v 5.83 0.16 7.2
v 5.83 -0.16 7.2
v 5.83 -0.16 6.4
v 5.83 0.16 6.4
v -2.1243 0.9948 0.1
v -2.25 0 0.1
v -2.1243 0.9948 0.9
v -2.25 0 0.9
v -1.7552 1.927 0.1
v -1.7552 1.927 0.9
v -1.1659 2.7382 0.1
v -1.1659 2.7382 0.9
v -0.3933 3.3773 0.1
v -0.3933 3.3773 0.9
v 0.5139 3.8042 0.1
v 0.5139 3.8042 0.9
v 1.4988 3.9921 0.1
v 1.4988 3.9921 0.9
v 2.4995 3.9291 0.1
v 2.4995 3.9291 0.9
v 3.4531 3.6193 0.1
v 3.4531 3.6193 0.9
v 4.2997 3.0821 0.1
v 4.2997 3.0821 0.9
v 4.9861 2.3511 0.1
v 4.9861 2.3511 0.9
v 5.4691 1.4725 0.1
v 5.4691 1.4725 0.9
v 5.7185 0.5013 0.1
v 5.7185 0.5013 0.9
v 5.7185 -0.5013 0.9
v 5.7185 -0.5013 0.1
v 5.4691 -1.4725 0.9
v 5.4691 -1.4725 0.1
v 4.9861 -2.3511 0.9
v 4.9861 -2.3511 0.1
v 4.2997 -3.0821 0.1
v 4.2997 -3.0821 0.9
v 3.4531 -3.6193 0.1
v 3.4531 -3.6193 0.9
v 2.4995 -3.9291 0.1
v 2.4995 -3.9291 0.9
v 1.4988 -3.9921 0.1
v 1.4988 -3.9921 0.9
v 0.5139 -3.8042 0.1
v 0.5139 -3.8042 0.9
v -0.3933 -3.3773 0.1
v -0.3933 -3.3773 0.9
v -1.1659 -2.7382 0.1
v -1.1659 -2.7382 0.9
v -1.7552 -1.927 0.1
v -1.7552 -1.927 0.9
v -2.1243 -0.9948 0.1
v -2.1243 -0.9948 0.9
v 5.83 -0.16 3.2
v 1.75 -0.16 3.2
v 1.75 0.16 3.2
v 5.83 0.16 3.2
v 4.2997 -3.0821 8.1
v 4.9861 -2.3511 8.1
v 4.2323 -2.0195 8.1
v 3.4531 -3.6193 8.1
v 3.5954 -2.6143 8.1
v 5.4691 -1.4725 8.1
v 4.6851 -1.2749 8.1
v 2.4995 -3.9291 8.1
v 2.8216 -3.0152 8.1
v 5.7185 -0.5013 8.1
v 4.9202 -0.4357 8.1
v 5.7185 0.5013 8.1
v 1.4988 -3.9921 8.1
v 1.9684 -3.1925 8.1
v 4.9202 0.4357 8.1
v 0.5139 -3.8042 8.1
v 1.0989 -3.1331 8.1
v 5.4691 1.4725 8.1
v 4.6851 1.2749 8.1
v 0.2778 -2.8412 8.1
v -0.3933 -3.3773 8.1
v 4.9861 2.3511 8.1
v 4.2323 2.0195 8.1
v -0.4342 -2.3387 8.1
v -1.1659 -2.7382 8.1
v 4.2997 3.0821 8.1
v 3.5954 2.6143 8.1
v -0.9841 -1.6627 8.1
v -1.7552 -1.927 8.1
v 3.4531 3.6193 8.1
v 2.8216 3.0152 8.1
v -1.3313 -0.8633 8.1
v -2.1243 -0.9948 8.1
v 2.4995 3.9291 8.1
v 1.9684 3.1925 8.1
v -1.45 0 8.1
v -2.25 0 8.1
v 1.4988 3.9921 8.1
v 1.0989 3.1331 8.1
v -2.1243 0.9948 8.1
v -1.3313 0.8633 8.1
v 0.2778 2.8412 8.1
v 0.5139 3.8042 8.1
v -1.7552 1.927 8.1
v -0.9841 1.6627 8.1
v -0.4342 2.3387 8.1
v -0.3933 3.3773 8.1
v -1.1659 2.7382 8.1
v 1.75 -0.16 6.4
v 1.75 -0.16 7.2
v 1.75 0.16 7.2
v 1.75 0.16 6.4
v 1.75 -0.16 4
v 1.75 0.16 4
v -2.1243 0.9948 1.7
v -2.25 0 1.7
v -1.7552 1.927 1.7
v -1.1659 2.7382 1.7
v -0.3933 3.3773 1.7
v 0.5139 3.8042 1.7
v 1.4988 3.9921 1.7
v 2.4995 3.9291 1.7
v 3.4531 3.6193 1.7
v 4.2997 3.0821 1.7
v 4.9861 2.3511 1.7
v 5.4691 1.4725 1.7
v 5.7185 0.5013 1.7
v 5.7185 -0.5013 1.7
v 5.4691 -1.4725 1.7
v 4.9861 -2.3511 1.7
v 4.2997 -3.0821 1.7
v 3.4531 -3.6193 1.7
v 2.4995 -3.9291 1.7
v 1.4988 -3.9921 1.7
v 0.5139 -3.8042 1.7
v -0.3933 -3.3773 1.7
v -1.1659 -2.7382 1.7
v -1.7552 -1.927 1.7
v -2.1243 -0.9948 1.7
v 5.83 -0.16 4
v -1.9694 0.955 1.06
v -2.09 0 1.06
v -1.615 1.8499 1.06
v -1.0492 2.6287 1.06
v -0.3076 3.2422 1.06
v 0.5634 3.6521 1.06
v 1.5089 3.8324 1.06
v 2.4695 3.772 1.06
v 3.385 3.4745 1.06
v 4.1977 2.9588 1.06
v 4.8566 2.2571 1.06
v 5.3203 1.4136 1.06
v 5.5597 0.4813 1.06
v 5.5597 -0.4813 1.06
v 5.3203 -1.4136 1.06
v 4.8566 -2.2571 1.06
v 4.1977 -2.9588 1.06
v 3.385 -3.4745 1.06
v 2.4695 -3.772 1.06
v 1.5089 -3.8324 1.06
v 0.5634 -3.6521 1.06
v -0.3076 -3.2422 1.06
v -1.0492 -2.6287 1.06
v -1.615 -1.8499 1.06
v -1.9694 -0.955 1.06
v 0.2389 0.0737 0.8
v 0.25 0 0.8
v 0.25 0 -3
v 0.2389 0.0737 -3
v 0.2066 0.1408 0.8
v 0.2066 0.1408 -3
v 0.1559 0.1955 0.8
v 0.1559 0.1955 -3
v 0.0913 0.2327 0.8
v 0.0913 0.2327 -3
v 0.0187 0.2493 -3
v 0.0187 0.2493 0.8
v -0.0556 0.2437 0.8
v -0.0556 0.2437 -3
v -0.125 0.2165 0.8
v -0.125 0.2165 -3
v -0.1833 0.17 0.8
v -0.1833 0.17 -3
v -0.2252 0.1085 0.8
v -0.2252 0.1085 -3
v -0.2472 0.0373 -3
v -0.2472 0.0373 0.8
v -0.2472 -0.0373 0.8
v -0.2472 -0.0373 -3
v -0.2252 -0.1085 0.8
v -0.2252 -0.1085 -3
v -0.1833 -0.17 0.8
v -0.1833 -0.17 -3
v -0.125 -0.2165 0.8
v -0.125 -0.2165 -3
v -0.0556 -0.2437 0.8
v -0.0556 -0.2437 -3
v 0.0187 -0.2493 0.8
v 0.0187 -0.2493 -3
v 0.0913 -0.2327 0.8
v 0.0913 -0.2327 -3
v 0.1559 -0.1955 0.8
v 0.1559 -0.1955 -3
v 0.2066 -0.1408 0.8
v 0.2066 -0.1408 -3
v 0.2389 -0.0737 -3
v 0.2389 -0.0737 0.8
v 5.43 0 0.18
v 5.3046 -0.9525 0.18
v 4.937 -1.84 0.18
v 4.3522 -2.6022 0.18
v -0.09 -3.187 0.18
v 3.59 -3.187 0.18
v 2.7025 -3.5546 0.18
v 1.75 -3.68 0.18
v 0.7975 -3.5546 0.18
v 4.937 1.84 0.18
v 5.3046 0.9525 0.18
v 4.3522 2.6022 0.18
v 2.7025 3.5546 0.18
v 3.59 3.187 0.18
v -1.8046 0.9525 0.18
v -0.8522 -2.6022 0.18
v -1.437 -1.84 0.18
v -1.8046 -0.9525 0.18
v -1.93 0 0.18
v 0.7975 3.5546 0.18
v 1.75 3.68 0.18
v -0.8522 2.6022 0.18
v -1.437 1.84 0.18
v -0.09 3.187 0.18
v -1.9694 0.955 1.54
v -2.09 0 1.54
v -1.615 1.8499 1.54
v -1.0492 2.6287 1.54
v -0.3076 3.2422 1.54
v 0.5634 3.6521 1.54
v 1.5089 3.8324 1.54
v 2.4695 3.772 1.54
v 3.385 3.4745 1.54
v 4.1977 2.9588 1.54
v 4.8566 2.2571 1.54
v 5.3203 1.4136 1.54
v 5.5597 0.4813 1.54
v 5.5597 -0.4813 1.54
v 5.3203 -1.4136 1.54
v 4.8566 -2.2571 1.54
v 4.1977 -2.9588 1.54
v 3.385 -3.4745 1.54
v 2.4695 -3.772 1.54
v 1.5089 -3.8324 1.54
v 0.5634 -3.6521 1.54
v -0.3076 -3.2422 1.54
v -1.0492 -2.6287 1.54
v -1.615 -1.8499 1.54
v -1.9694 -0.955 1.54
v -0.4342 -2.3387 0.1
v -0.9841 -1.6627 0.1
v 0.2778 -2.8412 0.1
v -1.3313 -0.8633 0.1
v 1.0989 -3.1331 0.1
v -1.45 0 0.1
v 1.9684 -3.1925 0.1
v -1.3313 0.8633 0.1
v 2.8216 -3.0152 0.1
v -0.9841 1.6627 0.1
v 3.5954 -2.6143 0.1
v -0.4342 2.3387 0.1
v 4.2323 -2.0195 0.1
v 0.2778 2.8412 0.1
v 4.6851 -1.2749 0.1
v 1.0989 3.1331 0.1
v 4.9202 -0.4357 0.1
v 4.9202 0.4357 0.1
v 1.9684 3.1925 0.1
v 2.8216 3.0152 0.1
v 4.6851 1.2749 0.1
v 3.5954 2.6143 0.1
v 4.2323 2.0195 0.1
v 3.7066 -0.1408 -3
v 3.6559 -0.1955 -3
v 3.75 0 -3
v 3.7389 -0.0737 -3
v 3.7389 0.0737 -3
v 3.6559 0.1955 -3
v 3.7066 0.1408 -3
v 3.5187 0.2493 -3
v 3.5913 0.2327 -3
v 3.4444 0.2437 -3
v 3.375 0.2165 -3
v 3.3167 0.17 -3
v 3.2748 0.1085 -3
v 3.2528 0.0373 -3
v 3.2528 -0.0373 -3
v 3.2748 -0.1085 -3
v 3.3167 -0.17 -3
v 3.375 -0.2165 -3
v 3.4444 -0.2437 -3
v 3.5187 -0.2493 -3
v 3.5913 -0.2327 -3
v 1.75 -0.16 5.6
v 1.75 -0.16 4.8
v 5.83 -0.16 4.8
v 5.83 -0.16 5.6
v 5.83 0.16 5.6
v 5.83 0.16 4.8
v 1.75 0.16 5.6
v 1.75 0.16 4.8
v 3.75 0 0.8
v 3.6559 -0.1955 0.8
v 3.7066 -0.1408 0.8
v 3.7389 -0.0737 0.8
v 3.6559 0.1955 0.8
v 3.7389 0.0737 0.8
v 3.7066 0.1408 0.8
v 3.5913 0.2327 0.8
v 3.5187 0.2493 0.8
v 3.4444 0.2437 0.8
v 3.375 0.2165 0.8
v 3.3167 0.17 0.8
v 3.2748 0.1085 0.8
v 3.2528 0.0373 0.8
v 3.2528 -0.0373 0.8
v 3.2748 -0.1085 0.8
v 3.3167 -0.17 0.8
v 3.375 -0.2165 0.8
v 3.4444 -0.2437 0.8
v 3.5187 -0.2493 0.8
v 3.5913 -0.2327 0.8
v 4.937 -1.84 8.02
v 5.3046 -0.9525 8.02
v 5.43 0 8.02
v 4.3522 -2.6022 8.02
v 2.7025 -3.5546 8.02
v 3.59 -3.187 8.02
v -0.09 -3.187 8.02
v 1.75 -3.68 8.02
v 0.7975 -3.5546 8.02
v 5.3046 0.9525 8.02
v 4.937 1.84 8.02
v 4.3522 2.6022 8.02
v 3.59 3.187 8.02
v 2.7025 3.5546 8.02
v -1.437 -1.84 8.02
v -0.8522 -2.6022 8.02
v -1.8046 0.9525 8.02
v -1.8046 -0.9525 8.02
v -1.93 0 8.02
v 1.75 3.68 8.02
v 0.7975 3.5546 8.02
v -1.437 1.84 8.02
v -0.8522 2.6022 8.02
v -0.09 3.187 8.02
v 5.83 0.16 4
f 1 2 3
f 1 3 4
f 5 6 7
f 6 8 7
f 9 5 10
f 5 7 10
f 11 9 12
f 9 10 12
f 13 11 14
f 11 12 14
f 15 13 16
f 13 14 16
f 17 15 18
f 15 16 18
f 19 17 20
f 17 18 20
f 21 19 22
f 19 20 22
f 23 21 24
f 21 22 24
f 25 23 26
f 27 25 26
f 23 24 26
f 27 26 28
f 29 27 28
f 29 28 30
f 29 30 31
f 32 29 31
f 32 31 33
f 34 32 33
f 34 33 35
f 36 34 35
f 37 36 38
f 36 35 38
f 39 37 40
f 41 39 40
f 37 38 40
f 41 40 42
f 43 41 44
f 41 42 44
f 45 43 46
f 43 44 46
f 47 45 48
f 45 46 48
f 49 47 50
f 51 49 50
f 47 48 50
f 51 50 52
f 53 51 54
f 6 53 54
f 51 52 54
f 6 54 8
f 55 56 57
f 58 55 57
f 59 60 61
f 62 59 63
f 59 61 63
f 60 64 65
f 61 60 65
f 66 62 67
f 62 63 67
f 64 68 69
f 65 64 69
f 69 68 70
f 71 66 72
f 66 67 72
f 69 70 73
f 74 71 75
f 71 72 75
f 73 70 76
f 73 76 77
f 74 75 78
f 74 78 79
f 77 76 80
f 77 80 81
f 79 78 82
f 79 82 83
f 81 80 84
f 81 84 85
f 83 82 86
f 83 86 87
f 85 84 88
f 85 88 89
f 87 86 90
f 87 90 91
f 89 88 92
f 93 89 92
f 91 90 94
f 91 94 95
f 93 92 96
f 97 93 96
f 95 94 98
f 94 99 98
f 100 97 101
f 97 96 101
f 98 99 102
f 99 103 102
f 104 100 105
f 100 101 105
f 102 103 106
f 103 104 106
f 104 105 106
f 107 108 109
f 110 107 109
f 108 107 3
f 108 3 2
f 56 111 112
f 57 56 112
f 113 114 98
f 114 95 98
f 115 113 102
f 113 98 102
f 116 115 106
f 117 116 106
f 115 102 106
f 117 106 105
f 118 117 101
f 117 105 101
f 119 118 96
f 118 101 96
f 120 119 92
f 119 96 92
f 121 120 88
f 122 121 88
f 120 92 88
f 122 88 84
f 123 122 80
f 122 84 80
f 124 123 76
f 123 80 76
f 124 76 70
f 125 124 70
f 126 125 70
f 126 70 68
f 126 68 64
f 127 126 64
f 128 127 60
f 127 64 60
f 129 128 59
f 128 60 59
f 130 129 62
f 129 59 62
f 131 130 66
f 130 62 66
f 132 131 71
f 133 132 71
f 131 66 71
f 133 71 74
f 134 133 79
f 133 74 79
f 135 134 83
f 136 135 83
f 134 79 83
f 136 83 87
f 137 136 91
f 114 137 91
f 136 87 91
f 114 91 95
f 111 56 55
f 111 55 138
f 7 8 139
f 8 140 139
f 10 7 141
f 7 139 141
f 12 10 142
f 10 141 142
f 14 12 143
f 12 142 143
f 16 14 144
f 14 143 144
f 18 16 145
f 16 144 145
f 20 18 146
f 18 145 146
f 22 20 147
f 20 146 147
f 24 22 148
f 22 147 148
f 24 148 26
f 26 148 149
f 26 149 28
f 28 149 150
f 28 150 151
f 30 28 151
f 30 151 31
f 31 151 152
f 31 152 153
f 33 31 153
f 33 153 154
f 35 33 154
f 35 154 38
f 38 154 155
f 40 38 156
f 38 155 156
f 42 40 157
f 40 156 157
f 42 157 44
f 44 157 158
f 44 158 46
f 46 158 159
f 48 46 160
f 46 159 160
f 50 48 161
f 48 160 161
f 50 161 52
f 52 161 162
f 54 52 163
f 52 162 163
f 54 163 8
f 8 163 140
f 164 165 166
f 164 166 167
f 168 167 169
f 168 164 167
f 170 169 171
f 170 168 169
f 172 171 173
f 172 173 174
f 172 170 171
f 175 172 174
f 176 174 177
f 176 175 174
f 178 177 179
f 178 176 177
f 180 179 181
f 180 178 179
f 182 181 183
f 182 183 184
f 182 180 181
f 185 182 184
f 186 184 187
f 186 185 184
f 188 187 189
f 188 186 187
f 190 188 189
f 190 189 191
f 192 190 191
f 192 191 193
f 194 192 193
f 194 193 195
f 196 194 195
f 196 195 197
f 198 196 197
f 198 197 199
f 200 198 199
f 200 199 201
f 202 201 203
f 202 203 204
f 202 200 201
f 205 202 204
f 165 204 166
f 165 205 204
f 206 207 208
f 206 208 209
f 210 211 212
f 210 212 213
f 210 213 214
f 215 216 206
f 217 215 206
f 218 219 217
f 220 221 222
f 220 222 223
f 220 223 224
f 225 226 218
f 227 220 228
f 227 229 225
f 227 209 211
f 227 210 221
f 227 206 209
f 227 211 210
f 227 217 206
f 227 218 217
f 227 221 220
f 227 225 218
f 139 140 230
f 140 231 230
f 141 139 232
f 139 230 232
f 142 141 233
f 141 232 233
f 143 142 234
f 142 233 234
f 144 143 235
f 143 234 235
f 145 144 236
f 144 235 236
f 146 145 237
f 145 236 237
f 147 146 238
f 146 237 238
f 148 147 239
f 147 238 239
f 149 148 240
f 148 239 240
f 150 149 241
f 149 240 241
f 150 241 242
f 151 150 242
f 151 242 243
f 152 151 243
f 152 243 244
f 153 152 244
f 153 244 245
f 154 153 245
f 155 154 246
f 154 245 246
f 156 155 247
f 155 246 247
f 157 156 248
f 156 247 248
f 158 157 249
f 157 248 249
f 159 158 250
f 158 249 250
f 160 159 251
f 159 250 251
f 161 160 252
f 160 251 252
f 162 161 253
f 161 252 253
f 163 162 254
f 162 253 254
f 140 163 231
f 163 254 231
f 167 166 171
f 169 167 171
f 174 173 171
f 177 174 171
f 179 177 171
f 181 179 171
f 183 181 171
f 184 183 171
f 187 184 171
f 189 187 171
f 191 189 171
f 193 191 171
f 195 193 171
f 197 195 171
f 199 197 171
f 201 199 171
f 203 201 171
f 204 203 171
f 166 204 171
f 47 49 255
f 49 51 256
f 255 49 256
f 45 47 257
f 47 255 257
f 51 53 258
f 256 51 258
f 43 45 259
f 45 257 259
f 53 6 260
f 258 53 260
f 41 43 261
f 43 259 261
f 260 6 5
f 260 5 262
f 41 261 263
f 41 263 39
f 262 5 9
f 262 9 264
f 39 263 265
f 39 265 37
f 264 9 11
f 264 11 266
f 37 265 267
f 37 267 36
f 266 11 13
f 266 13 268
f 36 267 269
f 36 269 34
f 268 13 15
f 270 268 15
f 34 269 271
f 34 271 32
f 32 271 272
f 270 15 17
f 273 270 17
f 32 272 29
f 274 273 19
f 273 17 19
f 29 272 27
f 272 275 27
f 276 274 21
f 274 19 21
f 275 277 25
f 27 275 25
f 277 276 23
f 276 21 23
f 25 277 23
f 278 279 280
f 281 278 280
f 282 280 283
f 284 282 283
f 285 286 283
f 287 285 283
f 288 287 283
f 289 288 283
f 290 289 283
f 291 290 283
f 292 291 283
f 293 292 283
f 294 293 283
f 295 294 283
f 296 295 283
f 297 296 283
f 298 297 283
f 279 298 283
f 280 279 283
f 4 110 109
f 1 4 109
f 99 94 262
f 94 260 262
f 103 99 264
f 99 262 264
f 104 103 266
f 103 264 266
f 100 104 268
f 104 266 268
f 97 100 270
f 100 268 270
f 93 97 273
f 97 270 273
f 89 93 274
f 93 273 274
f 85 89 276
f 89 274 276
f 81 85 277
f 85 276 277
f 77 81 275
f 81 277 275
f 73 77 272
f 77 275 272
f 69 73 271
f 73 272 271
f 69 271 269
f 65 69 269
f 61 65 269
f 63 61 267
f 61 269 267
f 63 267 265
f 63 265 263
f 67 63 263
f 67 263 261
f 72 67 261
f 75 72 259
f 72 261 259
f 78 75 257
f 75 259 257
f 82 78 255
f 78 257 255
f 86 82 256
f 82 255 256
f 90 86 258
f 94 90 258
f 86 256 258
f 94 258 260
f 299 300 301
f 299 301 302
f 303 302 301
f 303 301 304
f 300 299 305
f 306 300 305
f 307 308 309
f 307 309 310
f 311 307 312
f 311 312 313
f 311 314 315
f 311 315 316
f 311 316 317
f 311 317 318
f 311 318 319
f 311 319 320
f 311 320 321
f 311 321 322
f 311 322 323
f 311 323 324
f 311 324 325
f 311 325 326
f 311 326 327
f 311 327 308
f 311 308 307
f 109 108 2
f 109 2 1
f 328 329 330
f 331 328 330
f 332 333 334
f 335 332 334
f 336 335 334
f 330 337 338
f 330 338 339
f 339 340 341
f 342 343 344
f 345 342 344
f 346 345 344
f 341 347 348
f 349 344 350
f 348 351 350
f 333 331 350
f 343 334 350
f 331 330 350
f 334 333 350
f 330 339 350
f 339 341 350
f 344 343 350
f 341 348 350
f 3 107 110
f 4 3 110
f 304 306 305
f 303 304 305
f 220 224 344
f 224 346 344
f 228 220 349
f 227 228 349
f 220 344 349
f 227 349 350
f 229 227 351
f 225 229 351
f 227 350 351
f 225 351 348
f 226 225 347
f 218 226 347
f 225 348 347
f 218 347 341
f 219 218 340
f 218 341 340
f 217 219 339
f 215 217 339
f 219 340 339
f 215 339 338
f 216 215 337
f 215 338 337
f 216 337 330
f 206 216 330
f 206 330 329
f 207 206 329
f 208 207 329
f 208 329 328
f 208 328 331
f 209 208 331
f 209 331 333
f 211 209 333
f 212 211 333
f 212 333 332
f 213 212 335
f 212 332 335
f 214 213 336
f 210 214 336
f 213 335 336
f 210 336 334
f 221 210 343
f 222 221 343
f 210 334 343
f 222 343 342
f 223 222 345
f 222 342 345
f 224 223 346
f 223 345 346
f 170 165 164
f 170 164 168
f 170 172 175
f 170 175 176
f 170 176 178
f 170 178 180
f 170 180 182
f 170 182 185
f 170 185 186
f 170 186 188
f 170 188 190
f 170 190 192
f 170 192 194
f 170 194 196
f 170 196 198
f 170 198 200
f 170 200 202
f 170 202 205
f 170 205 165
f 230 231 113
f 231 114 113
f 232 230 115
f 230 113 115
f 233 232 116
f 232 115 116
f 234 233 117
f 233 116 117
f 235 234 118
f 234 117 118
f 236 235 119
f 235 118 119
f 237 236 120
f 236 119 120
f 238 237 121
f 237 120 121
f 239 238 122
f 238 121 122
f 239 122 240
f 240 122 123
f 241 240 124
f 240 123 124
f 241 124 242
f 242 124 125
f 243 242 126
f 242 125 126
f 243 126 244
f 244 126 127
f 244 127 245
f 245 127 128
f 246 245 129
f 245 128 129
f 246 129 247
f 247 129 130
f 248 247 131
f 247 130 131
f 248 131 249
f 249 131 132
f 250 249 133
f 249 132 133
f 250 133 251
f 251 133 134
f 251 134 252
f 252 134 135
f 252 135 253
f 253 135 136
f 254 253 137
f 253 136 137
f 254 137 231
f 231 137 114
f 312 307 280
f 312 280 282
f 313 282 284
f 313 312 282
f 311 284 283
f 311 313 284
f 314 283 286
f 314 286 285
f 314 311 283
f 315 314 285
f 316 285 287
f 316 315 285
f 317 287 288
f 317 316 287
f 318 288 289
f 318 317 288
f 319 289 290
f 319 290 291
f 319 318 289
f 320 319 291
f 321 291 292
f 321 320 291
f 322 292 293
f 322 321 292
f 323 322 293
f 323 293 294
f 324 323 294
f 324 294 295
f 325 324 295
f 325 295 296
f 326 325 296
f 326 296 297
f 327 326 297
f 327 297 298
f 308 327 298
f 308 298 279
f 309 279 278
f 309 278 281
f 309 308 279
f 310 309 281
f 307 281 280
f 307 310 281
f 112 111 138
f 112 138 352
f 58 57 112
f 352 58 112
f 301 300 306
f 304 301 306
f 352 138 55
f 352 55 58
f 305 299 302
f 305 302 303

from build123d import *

# Parameters (mm, degrees)
SKETCH002_W  = 3.68
SKETCH002_H  = 7.84
SKETCH003_R  = 0.25
PAD_DEPTH    = 3.8
SKETCH004_W  = 0.32
SKETCH004_H  = 0.8
PAD001_DEPTH = 4.08


with BuildPart() as revolution:
    # Sketch → Revolution (revolve)
    with BuildSketch(Plane.XZ):
        Polygon((-2.25, 0.1), (-2.25, 0.9), (-2.09, 1.06), (-2.09, 1.54), (-2.25, 1.7), (-2.25, 8.1), (-1.45, 8.1), (-1.45, 0.1), align=None)
    revolve(axis=Axis((1.75, 0, 7.548619), (0, 0, -1)))


with BuildPart() as revolution001:
    # Sketch002 → Revolution001 (revolve)
    with BuildSketch(Plane.XZ):
        with Locations((-0.09, 4.1)):
            Rectangle(SKETCH002_W, SKETCH002_H)
    revolve(axis=Axis((1.75, 0, 4.680116), (0, 0, -1)))


with BuildPart() as pad:
    # Sketch003 → Pad (new body)
    with BuildSketch(Plane.XY.offset(0.8)):
        Circle(SKETCH003_R)
        with Locations((3.5, 0)):
            Circle(SKETCH003_R)
    extrude(amount=-PAD_DEPTH)


with BuildPart() as pad001:
    # Sketch004 → Pad001 (new body)
    with BuildSketch(Plane.YZ.offset(1.75)):
        with Locations((0, 3.6)):
            Rectangle(SKETCH004_W, SKETCH004_H)
        with Locations((0, 5.2)):
            Rectangle(SKETCH004_W, SKETCH004_H)
        with Locations((0, 6.8)):
            Rectangle(SKETCH004_W, SKETCH004_H)
    extrude(amount=PAD001_DEPTH)


solid = Compound([revolution.part, revolution001.part, pad.part, pad001.part])
